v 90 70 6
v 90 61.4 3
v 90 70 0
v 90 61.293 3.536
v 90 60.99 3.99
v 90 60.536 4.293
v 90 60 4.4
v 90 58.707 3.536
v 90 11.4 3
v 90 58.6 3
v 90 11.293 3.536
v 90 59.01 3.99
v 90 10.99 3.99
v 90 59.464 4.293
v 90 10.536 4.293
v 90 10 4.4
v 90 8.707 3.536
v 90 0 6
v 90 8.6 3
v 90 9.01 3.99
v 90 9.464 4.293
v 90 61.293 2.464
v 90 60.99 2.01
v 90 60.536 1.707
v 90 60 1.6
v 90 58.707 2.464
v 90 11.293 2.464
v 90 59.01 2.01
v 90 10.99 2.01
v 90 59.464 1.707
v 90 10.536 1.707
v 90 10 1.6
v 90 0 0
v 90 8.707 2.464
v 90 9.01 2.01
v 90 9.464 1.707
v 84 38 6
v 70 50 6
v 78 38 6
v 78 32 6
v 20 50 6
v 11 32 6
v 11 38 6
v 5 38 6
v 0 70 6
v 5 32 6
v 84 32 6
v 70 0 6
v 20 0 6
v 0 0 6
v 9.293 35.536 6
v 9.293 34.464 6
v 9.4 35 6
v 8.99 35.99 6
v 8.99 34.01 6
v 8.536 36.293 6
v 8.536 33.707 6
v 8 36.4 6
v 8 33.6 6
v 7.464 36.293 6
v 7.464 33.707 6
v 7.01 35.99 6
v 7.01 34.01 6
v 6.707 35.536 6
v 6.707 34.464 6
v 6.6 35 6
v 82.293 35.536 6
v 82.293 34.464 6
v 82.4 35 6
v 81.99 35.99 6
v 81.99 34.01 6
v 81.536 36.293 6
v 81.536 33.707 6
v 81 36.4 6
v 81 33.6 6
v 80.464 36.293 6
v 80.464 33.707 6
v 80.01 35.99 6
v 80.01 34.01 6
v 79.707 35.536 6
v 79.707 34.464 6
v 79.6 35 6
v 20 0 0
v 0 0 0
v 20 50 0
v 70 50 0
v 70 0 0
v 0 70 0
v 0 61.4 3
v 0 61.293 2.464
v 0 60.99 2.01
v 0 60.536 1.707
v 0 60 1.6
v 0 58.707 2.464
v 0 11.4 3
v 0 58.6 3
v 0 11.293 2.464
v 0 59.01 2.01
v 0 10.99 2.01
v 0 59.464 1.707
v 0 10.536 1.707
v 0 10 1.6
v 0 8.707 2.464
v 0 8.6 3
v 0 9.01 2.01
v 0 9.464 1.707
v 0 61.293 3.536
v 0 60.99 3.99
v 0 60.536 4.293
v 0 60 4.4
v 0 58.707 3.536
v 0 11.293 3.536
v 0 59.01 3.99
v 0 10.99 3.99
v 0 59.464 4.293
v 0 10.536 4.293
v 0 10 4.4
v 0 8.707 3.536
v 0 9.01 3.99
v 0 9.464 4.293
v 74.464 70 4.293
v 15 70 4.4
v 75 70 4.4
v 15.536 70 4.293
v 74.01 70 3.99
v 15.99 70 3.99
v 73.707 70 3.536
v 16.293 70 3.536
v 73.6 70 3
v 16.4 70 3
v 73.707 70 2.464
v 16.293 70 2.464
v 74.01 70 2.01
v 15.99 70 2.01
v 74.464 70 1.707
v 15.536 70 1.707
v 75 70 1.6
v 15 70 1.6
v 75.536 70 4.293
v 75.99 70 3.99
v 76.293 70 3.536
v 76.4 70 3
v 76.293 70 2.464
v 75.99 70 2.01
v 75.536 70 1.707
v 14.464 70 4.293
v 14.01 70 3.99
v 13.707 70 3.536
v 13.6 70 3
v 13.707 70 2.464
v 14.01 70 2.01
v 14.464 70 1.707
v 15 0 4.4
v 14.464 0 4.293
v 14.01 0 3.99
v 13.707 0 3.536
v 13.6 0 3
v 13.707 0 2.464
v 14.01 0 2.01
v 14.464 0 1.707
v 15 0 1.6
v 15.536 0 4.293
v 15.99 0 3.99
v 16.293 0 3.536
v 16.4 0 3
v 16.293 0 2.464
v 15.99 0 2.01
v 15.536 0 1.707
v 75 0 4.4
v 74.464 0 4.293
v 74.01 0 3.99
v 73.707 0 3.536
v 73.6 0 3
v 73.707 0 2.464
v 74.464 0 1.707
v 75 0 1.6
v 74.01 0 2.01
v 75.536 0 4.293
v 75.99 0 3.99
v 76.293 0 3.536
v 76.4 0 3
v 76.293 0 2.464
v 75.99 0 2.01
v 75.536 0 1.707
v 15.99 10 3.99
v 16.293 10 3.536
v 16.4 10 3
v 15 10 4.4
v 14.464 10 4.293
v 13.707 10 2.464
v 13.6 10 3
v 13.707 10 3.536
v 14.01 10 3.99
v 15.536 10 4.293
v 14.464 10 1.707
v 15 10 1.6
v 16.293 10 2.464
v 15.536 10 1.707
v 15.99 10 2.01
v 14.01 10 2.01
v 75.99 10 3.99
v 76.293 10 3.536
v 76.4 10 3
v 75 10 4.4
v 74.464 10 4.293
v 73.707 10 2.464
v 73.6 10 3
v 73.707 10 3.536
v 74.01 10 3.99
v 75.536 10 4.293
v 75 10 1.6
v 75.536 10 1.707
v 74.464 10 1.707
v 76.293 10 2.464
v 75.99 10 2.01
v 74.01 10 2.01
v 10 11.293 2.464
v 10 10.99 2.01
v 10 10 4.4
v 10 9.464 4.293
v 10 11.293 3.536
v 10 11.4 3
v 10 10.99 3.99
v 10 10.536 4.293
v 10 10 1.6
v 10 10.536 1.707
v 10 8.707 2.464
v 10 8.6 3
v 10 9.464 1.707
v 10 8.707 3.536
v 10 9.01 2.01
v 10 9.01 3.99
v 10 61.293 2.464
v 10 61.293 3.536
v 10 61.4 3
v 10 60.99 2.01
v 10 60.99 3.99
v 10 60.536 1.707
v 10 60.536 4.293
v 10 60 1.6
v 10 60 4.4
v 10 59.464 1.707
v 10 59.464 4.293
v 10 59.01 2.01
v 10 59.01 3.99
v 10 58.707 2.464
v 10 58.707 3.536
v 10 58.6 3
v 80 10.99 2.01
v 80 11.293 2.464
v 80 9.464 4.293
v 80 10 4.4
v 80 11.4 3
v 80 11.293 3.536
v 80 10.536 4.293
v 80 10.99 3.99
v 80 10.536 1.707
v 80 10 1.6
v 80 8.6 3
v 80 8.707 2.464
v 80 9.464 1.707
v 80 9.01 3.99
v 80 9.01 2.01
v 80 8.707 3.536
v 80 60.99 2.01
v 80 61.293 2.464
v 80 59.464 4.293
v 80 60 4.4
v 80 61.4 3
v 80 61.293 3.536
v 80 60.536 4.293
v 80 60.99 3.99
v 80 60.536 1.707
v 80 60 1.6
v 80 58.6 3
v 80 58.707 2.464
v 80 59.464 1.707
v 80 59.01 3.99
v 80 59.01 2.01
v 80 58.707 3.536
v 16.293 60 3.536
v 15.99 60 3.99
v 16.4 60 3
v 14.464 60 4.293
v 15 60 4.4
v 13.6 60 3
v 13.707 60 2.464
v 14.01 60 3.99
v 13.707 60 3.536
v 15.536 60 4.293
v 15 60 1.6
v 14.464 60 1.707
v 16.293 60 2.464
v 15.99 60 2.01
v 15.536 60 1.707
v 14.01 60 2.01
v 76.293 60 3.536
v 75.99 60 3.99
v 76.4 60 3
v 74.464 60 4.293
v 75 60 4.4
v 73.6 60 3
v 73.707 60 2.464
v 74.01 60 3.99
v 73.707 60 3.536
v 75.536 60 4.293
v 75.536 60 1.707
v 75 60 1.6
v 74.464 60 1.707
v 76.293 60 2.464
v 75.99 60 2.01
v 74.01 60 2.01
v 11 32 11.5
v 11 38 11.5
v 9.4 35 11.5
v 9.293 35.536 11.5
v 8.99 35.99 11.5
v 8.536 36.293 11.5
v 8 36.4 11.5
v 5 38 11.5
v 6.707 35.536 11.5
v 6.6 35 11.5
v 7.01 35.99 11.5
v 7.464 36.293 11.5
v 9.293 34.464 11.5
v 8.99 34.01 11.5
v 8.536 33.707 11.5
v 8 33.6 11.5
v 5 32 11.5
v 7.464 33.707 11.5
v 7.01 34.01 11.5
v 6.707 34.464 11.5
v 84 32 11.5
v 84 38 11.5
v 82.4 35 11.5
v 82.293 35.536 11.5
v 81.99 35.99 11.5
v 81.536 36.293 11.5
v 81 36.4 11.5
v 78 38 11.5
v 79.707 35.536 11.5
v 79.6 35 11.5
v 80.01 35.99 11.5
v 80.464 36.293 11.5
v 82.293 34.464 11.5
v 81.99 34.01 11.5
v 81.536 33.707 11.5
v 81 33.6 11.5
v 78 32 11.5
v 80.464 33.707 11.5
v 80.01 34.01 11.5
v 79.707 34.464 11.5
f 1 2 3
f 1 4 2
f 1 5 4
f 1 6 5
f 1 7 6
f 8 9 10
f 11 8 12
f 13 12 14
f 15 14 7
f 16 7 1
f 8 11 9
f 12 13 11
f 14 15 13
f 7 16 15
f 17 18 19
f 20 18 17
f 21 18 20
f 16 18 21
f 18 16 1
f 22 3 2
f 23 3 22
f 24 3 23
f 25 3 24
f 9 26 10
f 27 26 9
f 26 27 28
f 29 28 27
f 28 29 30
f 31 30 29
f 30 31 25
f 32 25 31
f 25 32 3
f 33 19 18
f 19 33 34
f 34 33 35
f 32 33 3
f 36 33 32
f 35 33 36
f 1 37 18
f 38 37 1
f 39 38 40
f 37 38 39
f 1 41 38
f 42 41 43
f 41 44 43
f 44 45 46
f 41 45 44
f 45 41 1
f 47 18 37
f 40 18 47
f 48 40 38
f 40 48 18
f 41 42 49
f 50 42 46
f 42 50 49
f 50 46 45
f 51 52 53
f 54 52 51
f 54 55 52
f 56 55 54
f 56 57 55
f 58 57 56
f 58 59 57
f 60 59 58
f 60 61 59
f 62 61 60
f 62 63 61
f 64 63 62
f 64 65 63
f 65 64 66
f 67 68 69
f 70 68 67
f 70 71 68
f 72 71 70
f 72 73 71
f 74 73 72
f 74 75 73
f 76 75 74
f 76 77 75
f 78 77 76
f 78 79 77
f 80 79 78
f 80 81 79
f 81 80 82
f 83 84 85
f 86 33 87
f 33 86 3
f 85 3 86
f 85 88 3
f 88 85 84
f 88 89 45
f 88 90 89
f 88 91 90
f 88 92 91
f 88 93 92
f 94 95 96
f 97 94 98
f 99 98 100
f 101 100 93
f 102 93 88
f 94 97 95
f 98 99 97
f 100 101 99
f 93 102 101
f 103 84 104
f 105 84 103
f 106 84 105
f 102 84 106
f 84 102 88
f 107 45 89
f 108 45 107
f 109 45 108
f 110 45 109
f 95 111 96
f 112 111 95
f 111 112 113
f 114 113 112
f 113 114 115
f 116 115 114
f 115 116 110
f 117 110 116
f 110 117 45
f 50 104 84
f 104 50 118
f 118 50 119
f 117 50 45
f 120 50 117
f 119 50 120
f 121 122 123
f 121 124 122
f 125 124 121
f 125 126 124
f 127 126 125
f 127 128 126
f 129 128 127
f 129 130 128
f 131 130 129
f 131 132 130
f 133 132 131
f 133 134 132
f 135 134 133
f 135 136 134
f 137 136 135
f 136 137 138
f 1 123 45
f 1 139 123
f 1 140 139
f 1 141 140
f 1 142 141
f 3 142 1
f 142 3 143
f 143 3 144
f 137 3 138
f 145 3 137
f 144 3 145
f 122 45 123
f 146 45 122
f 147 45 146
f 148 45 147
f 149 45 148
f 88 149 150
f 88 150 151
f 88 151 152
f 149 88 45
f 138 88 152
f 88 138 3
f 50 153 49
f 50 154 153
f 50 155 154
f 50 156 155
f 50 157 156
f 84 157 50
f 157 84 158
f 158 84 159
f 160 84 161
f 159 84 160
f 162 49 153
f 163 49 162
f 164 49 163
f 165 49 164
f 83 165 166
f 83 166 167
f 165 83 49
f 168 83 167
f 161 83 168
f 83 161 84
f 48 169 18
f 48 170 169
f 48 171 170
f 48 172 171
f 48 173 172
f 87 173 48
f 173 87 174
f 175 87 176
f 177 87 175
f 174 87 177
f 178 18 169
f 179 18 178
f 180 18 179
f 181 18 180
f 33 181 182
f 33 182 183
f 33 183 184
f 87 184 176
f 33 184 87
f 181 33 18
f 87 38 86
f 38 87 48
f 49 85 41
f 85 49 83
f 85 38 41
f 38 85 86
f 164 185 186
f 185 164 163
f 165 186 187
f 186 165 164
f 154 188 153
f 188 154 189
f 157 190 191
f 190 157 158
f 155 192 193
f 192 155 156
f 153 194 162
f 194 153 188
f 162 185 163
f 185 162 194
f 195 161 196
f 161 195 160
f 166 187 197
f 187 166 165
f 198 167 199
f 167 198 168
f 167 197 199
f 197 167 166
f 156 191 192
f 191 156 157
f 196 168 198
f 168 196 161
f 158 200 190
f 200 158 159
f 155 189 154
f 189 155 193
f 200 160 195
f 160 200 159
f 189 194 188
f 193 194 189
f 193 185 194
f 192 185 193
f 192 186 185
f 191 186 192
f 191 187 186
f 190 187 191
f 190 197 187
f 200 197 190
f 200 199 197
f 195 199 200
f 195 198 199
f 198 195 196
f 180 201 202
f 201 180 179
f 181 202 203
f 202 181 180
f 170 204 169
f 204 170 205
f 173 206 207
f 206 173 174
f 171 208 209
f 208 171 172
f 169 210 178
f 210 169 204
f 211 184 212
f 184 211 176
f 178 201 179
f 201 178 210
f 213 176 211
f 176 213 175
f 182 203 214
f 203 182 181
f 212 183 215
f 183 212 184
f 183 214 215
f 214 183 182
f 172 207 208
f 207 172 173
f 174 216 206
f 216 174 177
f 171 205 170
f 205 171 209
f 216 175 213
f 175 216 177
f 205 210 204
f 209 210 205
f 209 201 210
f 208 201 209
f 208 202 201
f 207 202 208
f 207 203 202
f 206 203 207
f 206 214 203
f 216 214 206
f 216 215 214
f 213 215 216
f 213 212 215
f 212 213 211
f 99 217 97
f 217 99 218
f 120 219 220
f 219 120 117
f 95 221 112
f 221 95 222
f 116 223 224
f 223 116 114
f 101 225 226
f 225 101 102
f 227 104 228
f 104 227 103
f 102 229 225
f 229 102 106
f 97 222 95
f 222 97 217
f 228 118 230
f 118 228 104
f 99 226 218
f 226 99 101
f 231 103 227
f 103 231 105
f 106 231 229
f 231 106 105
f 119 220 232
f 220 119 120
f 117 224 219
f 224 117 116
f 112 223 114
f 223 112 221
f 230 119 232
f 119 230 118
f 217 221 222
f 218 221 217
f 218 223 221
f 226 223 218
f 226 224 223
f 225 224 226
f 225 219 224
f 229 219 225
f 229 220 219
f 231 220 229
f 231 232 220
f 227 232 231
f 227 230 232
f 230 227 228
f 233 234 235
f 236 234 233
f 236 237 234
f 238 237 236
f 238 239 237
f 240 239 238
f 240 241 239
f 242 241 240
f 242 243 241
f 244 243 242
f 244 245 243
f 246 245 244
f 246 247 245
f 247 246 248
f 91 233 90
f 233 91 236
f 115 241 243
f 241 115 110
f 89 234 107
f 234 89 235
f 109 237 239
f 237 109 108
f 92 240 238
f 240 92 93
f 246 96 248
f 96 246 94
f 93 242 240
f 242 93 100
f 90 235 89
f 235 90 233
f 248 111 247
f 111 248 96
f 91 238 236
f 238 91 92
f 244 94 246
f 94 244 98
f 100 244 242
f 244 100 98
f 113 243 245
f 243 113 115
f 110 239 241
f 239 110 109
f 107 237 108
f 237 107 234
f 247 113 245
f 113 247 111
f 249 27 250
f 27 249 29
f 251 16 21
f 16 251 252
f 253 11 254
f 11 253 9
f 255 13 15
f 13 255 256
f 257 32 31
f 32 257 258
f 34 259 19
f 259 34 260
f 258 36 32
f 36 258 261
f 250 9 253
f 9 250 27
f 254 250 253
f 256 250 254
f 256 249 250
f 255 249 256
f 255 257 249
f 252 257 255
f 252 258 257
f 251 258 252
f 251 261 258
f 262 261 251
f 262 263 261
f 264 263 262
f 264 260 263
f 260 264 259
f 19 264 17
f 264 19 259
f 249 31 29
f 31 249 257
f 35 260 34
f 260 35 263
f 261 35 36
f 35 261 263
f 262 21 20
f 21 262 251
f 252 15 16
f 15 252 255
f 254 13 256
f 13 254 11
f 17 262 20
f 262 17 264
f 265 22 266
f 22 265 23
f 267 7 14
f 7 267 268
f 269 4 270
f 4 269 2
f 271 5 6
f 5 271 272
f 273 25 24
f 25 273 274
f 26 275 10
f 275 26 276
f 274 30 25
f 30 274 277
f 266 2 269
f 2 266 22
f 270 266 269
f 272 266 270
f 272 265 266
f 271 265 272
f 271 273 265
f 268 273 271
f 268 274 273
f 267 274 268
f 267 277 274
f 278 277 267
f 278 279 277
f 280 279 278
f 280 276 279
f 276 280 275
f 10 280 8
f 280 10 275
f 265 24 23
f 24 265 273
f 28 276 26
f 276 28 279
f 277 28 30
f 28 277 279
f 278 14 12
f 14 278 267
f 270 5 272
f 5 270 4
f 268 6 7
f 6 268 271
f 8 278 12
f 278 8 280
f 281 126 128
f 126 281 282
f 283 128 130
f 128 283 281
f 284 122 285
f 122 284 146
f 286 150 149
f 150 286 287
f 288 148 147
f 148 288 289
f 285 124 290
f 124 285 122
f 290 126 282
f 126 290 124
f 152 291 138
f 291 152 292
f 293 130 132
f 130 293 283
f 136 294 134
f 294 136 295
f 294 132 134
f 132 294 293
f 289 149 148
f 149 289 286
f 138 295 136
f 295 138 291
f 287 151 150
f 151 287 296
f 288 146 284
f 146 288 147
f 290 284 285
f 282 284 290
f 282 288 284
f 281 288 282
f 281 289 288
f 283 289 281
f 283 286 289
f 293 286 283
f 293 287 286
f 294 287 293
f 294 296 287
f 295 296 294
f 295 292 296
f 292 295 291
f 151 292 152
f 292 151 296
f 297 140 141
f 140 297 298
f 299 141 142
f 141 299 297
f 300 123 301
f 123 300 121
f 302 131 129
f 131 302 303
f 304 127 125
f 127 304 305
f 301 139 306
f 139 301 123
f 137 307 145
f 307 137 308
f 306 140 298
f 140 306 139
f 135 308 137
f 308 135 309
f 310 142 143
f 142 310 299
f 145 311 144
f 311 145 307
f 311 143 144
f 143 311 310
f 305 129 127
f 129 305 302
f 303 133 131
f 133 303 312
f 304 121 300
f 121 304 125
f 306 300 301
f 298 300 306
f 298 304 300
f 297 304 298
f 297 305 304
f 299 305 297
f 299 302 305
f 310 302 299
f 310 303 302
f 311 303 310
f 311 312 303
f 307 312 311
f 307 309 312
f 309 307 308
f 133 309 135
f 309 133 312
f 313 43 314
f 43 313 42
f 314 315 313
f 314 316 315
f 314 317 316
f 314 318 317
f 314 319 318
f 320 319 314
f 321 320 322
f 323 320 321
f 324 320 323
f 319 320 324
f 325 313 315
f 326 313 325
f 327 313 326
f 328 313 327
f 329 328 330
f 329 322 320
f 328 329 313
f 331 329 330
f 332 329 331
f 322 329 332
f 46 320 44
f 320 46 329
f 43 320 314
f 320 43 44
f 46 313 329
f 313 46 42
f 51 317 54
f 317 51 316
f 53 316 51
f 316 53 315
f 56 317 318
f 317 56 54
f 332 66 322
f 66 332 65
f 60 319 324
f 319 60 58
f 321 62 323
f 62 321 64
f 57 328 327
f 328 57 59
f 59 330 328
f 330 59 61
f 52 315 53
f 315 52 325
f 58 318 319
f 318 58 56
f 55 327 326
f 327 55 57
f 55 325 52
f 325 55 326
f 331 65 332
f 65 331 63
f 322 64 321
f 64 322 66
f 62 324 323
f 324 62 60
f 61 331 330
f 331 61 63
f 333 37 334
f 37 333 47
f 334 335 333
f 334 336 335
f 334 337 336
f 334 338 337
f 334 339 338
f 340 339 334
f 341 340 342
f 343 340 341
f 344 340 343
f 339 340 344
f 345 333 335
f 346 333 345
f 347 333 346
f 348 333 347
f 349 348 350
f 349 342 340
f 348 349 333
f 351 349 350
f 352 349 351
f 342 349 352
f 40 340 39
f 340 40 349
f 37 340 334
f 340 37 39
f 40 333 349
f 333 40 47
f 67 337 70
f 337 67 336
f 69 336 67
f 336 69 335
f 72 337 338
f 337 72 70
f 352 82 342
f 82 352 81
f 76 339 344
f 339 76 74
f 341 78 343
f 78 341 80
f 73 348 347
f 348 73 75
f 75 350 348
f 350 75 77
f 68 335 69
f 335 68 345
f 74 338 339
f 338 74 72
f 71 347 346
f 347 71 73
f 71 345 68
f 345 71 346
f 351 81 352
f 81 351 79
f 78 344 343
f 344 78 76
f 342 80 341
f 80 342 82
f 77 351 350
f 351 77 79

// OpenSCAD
base_x_size = 90;
base_y_size = 70;
base_z_size = 6;

tap_hole_depth = 10;
tap_hole_r = 2.8/2; //M3.0 - 0.2

difference(){
	cube(size = [base_x_size, base_y_size, base_z_size], center = false);
	
	//切り欠き
	translate([20,0,0]) {
		cube(size = [50, 50, 8], center = false);
	}
	
	//backパネルねじ穴
	translate( [15 ,tap_hole_depth/2, base_z_size/2] ) rotate(a = [90, 0, 0] ){
		cylinder( h = tap_hole_depth, r = tap_hole_r, center = true , $fn=16 );
	}
	translate( [base_x_size - 15, tap_hole_depth/2, base_z_size/2] ) rotate(a = [90, 0, 0] ){
		cylinder( h = tap_hole_depth, r = tap_hole_r, center = true , $fn=16 );
	}

	//サイドパネルねじ穴
	translate( [tap_hole_depth/2, 10, base_z_size/2] ) rotate(a = [0, 90, 00] ){
		cylinder( h = tap_hole_depth, r = tap_hole_r, center = true , $fn=16 );
	}
	translate( [ tap_hole_depth/2, base_y_size - 10, base_z_size/2] ) rotate(a = [0, 90, 00] ){
		cylinder( h = tap_hole_depth, r = tap_hole_r, center = true , $fn=16 );
	}
	translate( [base_x_size - tap_hole_depth/2, 10, base_z_size/2] ) rotate(a = [0, 90, 00] ){
		cylinder( h = tap_hole_depth, r = tap_hole_r, center = true , $fn=16 );
	}
	translate( [base_x_size - tap_hole_depth/2, base_y_size - 10, base_z_size/2] ) rotate(a = [0, 90, 00] ){
		cylinder( h = tap_hole_depth, r = tap_hole_r, center = true , $fn=16 );
	}	

	//frontパネルねじ穴
	translate( [15 , base_y_size - tap_hole_depth/2, base_z_size/2] ) rotate(a = [90, 0, 0] ){
		cylinder( h = tap_hole_depth, r = tap_hole_r, center = true , $fn=16 );
	}
	translate( [base_x_size - 15, base_y_size - tap_hole_depth/2, base_z_size/2] ) rotate(a = [90, 0, 0] ){
		cylinder( h = tap_hole_depth, r = tap_hole_r, center = true , $fn=16 );
	}

}

pcb_mount_xy = 6;
pcb_mount_z = 5;
pcb_offset_x = 5;
pcb_offset_y = 35;
pcb_hole_x = 73;
pcb_hole_y = 45;

difference(){
	translate([pcb_offset_x + pcb_mount_xy/2 , pcb_offset_y, base_z_size+pcb_mount_z/2]) {
		cube(size = [pcb_mount_xy, pcb_mount_xy, base_z_size], center = true);
	}
	translate([pcb_offset_x + pcb_mount_xy/2 , pcb_offset_y, base_z_size+pcb_mount_z/2]) {
		cylinder( h = tap_hole_depth, r = tap_hole_r, center = true , $fn=16 );
	}
}
/*
difference(){
	translate([pcb_offset_x + pcb_mount_xy/2 , pcb_offset_y + pcb_hole_y, base_z_size+pcb_mount_z/2]) {
		cube(size = [pcb_mount_xy, pcb_mount_xy, base_z_size], center = true);
	}
	translate([pcb_offset_x + pcb_mount_xy/2 , pcb_offset_y + pcb_hole_y, base_z_size+pcb_mount_z/2]) {
		cylinder( h = tap_hole_depth, r = tap_hole_r, center = true , $fn=16 );
	}
}

difference(){
	translate([pcb_offset_x + pcb_mount_xy/2 + pcb_hole_x , pcb_offset_y + pcb_hole_y, base_z_size+pcb_mount_z/2]) {
		cube(size = [pcb_mount_xy, pcb_mount_xy, base_z_size], center = true);
	}
	translate([pcb_offset_x + pcb_mount_xy/2 + pcb_hole_x , pcb_offset_y + pcb_hole_y, base_z_size+pcb_mount_z/2]) {
		cylinder( h = tap_hole_depth, r = tap_hole_r, center = true , $fn=16 );
	}
}
*/
difference(){
	translate([pcb_offset_x + pcb_mount_xy/2 + pcb_hole_x , pcb_offset_y, base_z_size+pcb_mount_z/2]) {
		cube(size = [pcb_mount_xy, pcb_mount_xy, base_z_size], center = true);
	}
	translate([pcb_offset_x + pcb_mount_xy/2 + pcb_hole_x , pcb_offset_y, base_z_size+pcb_mount_z/2]) {
		cylinder( h = tap_hole_depth, r = tap_hole_r, center = true , $fn=16 );
	}
}
